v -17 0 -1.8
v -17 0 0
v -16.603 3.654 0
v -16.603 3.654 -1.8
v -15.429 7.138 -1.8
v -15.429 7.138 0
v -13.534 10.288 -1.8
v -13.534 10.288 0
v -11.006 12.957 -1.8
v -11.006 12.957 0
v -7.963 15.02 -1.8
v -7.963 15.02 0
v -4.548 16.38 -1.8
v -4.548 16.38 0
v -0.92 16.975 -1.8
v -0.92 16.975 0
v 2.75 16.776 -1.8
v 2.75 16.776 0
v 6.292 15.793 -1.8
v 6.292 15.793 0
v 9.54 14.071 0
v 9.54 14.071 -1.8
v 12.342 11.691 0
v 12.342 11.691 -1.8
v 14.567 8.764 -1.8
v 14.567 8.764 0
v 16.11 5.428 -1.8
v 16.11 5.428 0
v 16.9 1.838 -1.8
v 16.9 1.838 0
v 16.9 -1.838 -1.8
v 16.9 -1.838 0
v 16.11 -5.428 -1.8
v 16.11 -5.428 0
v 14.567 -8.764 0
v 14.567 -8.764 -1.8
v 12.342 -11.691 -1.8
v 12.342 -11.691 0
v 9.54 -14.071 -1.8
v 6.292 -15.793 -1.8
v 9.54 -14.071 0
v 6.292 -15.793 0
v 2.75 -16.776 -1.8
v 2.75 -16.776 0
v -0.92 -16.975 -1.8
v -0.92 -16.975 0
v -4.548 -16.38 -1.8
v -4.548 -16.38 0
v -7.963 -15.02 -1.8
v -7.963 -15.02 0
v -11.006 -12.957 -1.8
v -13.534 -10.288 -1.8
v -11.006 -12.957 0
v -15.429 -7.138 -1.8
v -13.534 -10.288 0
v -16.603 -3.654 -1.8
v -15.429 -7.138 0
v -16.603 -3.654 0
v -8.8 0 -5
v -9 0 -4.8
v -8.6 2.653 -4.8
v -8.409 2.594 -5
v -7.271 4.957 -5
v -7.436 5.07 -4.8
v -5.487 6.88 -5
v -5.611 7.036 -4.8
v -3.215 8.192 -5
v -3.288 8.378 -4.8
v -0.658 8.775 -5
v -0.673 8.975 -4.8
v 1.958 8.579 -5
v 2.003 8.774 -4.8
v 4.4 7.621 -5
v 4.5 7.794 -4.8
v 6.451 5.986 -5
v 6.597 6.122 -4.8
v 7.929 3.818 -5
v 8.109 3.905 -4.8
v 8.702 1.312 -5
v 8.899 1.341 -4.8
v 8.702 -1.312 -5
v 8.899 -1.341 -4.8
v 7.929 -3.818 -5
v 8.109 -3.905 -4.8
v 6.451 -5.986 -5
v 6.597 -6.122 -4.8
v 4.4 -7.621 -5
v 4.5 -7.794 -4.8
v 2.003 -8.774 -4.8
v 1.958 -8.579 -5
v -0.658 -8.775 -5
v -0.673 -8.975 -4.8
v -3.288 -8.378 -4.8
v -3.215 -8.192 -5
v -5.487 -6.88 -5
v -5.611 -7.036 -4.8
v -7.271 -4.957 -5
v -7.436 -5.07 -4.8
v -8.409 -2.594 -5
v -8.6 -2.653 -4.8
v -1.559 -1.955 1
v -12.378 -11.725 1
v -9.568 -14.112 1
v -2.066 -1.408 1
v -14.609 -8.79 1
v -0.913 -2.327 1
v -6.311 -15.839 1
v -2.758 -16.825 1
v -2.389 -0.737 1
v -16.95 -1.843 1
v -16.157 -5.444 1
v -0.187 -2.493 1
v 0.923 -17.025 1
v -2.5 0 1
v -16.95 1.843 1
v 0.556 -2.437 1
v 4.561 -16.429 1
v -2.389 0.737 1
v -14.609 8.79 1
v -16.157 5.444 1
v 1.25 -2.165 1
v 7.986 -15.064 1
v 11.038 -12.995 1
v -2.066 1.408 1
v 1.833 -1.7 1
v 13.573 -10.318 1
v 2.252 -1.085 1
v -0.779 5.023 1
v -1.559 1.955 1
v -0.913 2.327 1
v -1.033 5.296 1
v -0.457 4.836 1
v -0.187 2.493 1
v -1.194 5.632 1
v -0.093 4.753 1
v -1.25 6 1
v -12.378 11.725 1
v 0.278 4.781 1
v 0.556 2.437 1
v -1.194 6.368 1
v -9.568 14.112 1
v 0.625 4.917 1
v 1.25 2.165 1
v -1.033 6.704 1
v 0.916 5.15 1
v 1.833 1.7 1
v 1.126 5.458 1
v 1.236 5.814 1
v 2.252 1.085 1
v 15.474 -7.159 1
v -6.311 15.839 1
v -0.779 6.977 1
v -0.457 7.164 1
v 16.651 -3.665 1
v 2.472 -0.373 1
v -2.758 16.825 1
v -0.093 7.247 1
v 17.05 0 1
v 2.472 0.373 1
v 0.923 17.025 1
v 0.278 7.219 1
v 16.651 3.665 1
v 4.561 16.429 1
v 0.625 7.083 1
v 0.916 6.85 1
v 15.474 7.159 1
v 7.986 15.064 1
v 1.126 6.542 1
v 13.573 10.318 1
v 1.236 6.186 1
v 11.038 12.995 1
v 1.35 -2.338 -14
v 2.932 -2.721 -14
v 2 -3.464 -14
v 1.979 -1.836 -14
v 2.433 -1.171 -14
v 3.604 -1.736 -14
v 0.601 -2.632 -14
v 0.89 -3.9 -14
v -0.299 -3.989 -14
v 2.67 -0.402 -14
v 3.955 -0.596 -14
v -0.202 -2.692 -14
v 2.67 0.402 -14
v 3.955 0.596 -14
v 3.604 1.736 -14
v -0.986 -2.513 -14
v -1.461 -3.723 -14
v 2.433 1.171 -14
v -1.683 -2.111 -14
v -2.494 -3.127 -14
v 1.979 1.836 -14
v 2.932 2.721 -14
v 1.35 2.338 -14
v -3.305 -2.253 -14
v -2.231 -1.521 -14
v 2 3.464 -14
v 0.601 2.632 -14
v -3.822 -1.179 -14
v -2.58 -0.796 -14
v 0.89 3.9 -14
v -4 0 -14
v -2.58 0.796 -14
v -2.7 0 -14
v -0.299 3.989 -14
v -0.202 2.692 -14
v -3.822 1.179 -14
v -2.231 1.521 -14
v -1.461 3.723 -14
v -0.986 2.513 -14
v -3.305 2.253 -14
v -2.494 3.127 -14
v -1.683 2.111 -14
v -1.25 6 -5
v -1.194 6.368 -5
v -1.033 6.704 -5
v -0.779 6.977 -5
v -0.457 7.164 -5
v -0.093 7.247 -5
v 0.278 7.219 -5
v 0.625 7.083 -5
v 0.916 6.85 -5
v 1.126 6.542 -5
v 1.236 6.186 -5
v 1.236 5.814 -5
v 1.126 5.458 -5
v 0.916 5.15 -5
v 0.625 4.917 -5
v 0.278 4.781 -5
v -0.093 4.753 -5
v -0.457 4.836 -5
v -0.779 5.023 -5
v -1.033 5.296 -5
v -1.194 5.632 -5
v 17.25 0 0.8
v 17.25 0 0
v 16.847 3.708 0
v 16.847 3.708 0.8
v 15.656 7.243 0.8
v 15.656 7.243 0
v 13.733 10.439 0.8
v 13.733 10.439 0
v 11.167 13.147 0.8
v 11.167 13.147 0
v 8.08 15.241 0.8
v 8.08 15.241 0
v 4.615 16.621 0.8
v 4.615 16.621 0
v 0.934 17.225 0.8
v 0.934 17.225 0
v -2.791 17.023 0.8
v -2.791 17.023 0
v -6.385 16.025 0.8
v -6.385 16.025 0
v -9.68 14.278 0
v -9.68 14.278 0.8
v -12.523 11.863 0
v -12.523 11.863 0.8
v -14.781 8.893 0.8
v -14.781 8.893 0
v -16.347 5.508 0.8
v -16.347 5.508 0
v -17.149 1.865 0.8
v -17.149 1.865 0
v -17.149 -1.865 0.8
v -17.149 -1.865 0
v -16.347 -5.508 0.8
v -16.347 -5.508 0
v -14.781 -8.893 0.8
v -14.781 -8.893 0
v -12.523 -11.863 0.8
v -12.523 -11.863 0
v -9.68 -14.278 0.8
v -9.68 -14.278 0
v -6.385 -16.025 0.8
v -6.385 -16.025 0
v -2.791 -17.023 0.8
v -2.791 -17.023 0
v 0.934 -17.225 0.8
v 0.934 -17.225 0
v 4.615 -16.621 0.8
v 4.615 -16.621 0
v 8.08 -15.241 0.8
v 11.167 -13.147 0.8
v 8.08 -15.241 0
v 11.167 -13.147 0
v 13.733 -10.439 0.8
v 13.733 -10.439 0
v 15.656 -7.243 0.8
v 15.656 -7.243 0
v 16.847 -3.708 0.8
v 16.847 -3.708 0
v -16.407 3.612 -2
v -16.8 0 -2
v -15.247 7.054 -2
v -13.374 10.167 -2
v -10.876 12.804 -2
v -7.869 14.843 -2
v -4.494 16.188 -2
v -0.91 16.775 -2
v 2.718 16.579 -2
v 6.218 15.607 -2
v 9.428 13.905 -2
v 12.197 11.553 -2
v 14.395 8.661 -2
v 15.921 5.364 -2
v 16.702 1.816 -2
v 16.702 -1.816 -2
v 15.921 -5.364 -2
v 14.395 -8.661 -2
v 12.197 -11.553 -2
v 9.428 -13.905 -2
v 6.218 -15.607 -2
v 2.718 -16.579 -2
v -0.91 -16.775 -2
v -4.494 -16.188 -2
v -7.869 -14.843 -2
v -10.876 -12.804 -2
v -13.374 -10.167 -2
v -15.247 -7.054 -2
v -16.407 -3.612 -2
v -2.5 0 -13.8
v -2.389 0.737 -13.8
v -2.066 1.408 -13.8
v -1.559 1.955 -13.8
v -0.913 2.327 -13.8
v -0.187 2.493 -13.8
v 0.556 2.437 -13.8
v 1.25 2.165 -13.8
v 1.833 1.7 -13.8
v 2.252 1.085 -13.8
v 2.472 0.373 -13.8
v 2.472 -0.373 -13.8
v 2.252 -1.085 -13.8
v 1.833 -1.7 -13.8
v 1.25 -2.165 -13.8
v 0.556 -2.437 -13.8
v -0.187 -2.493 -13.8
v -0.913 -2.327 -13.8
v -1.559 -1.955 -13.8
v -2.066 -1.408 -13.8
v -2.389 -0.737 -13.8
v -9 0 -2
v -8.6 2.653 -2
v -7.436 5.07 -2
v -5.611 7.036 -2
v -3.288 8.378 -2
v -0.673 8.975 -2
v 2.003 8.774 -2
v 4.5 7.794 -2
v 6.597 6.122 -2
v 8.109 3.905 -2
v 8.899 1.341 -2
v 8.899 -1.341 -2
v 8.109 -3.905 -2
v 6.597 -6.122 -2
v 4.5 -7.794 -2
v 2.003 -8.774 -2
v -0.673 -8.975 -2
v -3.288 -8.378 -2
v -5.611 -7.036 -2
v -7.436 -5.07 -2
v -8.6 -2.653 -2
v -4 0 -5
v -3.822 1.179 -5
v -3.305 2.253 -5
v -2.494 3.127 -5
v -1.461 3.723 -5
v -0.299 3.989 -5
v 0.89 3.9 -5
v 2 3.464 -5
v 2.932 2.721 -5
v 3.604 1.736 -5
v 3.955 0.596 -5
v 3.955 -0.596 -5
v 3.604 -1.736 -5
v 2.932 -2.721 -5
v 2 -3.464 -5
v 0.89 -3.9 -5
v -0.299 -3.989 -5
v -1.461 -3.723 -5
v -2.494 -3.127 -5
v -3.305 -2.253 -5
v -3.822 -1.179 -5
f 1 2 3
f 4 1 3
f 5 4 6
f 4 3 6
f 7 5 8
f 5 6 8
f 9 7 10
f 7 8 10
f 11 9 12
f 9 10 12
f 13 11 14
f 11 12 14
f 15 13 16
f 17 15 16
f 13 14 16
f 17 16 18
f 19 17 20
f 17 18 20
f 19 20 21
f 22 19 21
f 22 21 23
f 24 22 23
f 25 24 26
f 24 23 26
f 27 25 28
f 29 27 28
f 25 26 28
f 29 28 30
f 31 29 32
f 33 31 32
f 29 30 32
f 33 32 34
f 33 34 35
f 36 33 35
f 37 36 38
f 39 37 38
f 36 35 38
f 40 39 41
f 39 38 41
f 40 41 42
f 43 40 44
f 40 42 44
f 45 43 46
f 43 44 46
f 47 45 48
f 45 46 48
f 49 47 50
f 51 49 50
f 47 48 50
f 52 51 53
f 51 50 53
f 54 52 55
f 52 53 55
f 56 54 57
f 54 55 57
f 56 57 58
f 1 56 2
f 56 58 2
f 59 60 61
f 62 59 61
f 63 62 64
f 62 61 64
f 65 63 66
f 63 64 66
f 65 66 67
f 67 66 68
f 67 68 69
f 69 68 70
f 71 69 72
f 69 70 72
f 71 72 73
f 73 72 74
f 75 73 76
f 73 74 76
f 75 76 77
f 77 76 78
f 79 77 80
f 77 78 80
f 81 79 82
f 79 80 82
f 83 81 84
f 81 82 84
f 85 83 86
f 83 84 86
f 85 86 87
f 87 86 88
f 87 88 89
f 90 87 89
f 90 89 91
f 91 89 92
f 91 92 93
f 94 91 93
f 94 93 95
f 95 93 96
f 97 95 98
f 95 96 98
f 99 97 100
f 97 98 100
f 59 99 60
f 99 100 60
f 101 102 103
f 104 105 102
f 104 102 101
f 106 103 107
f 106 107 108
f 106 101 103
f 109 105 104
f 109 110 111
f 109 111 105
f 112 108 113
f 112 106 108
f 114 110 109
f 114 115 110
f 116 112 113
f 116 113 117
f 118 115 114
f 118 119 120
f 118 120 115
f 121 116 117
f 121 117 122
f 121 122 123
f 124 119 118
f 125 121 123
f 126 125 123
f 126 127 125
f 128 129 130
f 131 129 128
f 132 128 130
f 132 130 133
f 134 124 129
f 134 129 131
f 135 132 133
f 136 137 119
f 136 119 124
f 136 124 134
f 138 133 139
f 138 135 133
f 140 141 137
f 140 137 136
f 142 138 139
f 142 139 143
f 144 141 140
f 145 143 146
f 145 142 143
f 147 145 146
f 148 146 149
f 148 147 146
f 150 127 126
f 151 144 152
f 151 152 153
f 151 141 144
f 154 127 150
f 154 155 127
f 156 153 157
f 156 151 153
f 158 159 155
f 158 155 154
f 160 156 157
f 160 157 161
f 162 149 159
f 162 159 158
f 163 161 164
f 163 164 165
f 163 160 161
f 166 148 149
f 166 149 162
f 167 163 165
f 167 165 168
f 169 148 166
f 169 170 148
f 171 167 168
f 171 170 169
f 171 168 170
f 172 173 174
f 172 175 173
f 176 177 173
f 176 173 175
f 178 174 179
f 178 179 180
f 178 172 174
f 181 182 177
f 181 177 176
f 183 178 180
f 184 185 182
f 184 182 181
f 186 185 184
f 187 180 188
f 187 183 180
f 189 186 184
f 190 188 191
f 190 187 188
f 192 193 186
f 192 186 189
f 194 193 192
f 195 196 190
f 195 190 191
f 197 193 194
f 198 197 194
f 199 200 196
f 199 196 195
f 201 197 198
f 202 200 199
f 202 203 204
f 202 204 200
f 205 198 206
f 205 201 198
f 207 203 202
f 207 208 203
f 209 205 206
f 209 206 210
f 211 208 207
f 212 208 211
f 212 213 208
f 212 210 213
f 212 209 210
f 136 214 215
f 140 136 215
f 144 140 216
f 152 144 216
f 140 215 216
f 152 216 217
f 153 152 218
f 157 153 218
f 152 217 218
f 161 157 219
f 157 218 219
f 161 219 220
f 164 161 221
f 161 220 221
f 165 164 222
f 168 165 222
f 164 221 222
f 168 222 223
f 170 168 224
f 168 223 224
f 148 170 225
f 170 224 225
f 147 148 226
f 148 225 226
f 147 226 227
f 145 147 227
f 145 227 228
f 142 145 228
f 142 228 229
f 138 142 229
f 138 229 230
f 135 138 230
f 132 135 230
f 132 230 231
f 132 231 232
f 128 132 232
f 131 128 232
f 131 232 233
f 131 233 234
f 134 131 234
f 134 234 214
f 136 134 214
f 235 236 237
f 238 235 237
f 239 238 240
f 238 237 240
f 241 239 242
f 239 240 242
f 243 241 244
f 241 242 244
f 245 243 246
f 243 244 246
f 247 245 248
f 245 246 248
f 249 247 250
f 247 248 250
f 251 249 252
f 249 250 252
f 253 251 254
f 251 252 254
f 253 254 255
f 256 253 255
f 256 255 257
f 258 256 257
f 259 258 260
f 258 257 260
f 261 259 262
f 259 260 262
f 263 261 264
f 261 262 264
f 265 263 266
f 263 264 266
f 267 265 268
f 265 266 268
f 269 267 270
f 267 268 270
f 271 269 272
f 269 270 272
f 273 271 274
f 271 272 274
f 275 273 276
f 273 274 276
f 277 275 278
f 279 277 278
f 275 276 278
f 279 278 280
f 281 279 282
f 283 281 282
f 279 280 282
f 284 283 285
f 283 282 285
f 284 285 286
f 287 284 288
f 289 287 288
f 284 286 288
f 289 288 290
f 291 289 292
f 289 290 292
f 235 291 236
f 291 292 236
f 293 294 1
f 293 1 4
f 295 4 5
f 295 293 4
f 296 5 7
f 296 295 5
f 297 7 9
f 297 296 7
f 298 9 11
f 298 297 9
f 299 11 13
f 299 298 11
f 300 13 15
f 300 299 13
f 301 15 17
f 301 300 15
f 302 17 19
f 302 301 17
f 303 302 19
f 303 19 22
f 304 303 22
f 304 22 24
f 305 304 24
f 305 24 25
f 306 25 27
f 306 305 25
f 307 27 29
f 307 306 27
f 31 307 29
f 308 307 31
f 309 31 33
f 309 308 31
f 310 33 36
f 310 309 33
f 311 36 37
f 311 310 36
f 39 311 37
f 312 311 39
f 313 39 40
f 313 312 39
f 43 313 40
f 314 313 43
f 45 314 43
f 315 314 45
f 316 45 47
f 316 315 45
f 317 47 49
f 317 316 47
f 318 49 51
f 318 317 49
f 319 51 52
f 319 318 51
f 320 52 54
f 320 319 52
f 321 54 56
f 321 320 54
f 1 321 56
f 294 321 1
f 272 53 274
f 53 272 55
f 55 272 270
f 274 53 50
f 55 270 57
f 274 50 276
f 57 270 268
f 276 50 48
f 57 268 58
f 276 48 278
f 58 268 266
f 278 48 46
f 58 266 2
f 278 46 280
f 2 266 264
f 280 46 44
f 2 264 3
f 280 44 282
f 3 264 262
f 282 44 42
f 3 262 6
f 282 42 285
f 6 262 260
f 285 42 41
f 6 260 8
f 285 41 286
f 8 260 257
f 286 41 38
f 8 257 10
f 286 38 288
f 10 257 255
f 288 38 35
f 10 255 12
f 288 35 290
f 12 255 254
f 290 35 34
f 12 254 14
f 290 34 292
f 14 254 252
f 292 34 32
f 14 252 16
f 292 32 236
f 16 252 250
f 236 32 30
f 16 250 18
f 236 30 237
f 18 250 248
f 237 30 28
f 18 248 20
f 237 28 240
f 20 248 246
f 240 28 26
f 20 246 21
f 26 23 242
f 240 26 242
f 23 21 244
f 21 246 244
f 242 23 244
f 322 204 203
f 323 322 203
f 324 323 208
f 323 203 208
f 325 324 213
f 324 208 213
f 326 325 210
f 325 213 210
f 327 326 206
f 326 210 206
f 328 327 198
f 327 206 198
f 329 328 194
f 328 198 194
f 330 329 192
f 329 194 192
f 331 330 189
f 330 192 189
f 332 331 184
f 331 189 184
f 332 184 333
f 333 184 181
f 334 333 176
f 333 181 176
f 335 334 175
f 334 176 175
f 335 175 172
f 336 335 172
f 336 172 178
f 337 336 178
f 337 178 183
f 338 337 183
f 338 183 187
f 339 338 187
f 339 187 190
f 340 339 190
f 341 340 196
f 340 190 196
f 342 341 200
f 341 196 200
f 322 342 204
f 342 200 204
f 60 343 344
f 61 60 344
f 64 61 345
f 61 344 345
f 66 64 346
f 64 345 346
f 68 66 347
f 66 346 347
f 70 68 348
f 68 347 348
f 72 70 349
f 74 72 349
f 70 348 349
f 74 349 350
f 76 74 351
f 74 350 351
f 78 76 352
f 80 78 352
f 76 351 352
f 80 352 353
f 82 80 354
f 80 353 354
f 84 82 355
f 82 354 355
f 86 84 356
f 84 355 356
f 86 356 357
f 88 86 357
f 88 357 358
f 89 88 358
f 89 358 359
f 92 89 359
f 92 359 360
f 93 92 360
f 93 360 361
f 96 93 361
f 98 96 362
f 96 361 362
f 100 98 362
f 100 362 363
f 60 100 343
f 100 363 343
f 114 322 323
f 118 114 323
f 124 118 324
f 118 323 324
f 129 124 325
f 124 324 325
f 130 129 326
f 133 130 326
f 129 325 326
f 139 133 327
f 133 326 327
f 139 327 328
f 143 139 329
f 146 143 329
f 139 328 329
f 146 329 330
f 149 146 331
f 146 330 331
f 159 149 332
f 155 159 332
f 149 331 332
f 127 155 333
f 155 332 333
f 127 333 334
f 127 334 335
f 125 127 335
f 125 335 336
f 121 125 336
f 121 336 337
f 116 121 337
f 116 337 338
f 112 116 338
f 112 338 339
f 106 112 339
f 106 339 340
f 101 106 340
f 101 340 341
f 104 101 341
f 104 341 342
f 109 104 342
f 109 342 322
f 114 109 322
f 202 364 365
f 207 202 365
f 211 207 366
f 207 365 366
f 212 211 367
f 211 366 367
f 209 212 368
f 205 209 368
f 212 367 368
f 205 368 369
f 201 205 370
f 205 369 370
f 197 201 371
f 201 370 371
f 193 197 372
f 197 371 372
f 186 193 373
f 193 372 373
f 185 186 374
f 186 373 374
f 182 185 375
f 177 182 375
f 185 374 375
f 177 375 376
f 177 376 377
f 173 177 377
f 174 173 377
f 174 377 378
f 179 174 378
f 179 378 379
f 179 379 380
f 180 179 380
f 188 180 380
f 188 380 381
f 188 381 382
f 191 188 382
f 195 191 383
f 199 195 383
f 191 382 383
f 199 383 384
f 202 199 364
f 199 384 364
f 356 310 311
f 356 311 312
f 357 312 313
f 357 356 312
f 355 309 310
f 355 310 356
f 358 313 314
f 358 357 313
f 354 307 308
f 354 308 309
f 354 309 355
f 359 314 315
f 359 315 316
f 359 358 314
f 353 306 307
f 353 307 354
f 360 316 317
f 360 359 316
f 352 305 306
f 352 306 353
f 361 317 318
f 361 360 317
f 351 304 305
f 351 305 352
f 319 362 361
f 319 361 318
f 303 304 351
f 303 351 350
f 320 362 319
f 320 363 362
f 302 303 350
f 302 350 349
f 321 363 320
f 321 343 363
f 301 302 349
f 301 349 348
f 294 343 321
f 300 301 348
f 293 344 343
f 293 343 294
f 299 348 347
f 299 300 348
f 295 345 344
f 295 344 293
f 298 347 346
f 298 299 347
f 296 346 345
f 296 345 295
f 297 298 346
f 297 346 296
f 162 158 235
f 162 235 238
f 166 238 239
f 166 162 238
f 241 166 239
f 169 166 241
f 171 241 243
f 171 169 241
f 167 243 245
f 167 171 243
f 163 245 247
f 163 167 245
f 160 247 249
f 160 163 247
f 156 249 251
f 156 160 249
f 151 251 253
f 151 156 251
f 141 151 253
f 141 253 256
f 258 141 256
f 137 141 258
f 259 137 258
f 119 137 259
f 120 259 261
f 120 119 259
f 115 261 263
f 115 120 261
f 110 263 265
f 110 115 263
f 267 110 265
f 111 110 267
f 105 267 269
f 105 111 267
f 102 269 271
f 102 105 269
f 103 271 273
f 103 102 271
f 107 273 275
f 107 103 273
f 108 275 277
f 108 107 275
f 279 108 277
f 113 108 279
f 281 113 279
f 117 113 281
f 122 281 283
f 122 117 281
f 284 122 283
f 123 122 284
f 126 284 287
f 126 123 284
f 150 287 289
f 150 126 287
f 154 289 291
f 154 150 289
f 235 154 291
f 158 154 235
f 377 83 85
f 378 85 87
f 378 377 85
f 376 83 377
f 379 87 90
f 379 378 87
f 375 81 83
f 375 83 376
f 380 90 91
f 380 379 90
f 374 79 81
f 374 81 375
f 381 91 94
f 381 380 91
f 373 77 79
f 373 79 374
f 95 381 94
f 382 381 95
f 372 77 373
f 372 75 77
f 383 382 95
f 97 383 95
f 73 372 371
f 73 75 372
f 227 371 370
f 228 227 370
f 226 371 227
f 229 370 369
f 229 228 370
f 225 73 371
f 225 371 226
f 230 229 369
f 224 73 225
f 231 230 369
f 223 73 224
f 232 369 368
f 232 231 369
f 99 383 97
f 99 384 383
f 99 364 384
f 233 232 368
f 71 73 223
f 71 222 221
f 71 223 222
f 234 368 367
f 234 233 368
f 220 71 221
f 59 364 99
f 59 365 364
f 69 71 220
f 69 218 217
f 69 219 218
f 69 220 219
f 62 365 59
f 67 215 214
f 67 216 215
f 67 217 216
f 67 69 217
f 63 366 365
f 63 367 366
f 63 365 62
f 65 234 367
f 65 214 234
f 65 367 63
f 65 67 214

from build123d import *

# Parameters (mm, degrees)
SKETCH1_R           = 17.25
BOSS_EXTRUDE1_DEPTH = 1
SKETCH2_R           = 17
BOSS_EXTRUDE2_DEPTH = 2
SKETCH3_R           = 9
BOSS_EXTRUDE3_DEPTH = 3
SKETCH4_R           = 4
BOSS_EXTRUDE4_DEPTH = 9
SKETCH5_R           = 2.5
CUT_EXTRUDE1_DEPTH  = 29.637824638
SKETCH6_R           = 1.25
CUT_EXTRUDE2_DEPTH  = 27.002403735
CHAMFER1_SIZE       = 0.2


with BuildPart() as part:
    # Sketch1 → Boss-Extrude1 (new body)
    with BuildSketch(Plane.XY):
        Circle(SKETCH1_R)
    extrude(amount=BOSS_EXTRUDE1_DEPTH)

    # Sketch2 → Boss-Extrude2 (add)
    with BuildSketch(Plane(origin=(0, 0, 0), x_dir=(-1, 0, 0), z_dir=(0, 0, -1))):
        Circle(SKETCH2_R)
    extrude(amount=BOSS_EXTRUDE2_DEPTH)

    # Sketch3 → Boss-Extrude3 (add)
    with BuildSketch(Plane(origin=(0, 0, -2), x_dir=(-1, 0, 0), z_dir=(0, 0, -1))):
        Circle(SKETCH3_R)
    extrude(amount=BOSS_EXTRUDE3_DEPTH)

    # Sketch4 → Boss-Extrude4 (add)
    with BuildSketch(Plane(origin=(0, 0, -5), x_dir=(-1, 0, 0), z_dir=(0, 0, -1))):
        Circle(SKETCH4_R)
    extrude(amount=BOSS_EXTRUDE4_DEPTH)

    # Sketch5 → Cut-Extrude1 (cut, through all)
    with BuildSketch(Plane(origin=(0, 0, -14), x_dir=(-1, 0, 0), z_dir=(0, 0, -1))):
        Circle(SKETCH5_R)
    extrude(amount=-CUT_EXTRUDE1_DEPTH, mode=Mode.SUBTRACT)

    # Sketch6 → Cut-Extrude2 (cut, through all)
    with BuildSketch(Plane(origin=(0, 0, -5), x_dir=(-1, 0, 0), z_dir=(0, 0, -1))):
        with Locations((0, 6)):
            Circle(SKETCH6_R)
    extrude(amount=-CUT_EXTRUDE2_DEPTH, mode=Mode.SUBTRACT)

    # Chamfer1
    chamfer1_edges = [part.edges().sort_by_distance(p)[0] for p in [
        (9, 0, -5),
        (2.5, 0, -14),
        (-17.25, 0, 1),
        (17, 0, -2),
    ]]
    chamfer(chamfer1_edges, length=CHAMFER1_SIZE)


solid = part.part
